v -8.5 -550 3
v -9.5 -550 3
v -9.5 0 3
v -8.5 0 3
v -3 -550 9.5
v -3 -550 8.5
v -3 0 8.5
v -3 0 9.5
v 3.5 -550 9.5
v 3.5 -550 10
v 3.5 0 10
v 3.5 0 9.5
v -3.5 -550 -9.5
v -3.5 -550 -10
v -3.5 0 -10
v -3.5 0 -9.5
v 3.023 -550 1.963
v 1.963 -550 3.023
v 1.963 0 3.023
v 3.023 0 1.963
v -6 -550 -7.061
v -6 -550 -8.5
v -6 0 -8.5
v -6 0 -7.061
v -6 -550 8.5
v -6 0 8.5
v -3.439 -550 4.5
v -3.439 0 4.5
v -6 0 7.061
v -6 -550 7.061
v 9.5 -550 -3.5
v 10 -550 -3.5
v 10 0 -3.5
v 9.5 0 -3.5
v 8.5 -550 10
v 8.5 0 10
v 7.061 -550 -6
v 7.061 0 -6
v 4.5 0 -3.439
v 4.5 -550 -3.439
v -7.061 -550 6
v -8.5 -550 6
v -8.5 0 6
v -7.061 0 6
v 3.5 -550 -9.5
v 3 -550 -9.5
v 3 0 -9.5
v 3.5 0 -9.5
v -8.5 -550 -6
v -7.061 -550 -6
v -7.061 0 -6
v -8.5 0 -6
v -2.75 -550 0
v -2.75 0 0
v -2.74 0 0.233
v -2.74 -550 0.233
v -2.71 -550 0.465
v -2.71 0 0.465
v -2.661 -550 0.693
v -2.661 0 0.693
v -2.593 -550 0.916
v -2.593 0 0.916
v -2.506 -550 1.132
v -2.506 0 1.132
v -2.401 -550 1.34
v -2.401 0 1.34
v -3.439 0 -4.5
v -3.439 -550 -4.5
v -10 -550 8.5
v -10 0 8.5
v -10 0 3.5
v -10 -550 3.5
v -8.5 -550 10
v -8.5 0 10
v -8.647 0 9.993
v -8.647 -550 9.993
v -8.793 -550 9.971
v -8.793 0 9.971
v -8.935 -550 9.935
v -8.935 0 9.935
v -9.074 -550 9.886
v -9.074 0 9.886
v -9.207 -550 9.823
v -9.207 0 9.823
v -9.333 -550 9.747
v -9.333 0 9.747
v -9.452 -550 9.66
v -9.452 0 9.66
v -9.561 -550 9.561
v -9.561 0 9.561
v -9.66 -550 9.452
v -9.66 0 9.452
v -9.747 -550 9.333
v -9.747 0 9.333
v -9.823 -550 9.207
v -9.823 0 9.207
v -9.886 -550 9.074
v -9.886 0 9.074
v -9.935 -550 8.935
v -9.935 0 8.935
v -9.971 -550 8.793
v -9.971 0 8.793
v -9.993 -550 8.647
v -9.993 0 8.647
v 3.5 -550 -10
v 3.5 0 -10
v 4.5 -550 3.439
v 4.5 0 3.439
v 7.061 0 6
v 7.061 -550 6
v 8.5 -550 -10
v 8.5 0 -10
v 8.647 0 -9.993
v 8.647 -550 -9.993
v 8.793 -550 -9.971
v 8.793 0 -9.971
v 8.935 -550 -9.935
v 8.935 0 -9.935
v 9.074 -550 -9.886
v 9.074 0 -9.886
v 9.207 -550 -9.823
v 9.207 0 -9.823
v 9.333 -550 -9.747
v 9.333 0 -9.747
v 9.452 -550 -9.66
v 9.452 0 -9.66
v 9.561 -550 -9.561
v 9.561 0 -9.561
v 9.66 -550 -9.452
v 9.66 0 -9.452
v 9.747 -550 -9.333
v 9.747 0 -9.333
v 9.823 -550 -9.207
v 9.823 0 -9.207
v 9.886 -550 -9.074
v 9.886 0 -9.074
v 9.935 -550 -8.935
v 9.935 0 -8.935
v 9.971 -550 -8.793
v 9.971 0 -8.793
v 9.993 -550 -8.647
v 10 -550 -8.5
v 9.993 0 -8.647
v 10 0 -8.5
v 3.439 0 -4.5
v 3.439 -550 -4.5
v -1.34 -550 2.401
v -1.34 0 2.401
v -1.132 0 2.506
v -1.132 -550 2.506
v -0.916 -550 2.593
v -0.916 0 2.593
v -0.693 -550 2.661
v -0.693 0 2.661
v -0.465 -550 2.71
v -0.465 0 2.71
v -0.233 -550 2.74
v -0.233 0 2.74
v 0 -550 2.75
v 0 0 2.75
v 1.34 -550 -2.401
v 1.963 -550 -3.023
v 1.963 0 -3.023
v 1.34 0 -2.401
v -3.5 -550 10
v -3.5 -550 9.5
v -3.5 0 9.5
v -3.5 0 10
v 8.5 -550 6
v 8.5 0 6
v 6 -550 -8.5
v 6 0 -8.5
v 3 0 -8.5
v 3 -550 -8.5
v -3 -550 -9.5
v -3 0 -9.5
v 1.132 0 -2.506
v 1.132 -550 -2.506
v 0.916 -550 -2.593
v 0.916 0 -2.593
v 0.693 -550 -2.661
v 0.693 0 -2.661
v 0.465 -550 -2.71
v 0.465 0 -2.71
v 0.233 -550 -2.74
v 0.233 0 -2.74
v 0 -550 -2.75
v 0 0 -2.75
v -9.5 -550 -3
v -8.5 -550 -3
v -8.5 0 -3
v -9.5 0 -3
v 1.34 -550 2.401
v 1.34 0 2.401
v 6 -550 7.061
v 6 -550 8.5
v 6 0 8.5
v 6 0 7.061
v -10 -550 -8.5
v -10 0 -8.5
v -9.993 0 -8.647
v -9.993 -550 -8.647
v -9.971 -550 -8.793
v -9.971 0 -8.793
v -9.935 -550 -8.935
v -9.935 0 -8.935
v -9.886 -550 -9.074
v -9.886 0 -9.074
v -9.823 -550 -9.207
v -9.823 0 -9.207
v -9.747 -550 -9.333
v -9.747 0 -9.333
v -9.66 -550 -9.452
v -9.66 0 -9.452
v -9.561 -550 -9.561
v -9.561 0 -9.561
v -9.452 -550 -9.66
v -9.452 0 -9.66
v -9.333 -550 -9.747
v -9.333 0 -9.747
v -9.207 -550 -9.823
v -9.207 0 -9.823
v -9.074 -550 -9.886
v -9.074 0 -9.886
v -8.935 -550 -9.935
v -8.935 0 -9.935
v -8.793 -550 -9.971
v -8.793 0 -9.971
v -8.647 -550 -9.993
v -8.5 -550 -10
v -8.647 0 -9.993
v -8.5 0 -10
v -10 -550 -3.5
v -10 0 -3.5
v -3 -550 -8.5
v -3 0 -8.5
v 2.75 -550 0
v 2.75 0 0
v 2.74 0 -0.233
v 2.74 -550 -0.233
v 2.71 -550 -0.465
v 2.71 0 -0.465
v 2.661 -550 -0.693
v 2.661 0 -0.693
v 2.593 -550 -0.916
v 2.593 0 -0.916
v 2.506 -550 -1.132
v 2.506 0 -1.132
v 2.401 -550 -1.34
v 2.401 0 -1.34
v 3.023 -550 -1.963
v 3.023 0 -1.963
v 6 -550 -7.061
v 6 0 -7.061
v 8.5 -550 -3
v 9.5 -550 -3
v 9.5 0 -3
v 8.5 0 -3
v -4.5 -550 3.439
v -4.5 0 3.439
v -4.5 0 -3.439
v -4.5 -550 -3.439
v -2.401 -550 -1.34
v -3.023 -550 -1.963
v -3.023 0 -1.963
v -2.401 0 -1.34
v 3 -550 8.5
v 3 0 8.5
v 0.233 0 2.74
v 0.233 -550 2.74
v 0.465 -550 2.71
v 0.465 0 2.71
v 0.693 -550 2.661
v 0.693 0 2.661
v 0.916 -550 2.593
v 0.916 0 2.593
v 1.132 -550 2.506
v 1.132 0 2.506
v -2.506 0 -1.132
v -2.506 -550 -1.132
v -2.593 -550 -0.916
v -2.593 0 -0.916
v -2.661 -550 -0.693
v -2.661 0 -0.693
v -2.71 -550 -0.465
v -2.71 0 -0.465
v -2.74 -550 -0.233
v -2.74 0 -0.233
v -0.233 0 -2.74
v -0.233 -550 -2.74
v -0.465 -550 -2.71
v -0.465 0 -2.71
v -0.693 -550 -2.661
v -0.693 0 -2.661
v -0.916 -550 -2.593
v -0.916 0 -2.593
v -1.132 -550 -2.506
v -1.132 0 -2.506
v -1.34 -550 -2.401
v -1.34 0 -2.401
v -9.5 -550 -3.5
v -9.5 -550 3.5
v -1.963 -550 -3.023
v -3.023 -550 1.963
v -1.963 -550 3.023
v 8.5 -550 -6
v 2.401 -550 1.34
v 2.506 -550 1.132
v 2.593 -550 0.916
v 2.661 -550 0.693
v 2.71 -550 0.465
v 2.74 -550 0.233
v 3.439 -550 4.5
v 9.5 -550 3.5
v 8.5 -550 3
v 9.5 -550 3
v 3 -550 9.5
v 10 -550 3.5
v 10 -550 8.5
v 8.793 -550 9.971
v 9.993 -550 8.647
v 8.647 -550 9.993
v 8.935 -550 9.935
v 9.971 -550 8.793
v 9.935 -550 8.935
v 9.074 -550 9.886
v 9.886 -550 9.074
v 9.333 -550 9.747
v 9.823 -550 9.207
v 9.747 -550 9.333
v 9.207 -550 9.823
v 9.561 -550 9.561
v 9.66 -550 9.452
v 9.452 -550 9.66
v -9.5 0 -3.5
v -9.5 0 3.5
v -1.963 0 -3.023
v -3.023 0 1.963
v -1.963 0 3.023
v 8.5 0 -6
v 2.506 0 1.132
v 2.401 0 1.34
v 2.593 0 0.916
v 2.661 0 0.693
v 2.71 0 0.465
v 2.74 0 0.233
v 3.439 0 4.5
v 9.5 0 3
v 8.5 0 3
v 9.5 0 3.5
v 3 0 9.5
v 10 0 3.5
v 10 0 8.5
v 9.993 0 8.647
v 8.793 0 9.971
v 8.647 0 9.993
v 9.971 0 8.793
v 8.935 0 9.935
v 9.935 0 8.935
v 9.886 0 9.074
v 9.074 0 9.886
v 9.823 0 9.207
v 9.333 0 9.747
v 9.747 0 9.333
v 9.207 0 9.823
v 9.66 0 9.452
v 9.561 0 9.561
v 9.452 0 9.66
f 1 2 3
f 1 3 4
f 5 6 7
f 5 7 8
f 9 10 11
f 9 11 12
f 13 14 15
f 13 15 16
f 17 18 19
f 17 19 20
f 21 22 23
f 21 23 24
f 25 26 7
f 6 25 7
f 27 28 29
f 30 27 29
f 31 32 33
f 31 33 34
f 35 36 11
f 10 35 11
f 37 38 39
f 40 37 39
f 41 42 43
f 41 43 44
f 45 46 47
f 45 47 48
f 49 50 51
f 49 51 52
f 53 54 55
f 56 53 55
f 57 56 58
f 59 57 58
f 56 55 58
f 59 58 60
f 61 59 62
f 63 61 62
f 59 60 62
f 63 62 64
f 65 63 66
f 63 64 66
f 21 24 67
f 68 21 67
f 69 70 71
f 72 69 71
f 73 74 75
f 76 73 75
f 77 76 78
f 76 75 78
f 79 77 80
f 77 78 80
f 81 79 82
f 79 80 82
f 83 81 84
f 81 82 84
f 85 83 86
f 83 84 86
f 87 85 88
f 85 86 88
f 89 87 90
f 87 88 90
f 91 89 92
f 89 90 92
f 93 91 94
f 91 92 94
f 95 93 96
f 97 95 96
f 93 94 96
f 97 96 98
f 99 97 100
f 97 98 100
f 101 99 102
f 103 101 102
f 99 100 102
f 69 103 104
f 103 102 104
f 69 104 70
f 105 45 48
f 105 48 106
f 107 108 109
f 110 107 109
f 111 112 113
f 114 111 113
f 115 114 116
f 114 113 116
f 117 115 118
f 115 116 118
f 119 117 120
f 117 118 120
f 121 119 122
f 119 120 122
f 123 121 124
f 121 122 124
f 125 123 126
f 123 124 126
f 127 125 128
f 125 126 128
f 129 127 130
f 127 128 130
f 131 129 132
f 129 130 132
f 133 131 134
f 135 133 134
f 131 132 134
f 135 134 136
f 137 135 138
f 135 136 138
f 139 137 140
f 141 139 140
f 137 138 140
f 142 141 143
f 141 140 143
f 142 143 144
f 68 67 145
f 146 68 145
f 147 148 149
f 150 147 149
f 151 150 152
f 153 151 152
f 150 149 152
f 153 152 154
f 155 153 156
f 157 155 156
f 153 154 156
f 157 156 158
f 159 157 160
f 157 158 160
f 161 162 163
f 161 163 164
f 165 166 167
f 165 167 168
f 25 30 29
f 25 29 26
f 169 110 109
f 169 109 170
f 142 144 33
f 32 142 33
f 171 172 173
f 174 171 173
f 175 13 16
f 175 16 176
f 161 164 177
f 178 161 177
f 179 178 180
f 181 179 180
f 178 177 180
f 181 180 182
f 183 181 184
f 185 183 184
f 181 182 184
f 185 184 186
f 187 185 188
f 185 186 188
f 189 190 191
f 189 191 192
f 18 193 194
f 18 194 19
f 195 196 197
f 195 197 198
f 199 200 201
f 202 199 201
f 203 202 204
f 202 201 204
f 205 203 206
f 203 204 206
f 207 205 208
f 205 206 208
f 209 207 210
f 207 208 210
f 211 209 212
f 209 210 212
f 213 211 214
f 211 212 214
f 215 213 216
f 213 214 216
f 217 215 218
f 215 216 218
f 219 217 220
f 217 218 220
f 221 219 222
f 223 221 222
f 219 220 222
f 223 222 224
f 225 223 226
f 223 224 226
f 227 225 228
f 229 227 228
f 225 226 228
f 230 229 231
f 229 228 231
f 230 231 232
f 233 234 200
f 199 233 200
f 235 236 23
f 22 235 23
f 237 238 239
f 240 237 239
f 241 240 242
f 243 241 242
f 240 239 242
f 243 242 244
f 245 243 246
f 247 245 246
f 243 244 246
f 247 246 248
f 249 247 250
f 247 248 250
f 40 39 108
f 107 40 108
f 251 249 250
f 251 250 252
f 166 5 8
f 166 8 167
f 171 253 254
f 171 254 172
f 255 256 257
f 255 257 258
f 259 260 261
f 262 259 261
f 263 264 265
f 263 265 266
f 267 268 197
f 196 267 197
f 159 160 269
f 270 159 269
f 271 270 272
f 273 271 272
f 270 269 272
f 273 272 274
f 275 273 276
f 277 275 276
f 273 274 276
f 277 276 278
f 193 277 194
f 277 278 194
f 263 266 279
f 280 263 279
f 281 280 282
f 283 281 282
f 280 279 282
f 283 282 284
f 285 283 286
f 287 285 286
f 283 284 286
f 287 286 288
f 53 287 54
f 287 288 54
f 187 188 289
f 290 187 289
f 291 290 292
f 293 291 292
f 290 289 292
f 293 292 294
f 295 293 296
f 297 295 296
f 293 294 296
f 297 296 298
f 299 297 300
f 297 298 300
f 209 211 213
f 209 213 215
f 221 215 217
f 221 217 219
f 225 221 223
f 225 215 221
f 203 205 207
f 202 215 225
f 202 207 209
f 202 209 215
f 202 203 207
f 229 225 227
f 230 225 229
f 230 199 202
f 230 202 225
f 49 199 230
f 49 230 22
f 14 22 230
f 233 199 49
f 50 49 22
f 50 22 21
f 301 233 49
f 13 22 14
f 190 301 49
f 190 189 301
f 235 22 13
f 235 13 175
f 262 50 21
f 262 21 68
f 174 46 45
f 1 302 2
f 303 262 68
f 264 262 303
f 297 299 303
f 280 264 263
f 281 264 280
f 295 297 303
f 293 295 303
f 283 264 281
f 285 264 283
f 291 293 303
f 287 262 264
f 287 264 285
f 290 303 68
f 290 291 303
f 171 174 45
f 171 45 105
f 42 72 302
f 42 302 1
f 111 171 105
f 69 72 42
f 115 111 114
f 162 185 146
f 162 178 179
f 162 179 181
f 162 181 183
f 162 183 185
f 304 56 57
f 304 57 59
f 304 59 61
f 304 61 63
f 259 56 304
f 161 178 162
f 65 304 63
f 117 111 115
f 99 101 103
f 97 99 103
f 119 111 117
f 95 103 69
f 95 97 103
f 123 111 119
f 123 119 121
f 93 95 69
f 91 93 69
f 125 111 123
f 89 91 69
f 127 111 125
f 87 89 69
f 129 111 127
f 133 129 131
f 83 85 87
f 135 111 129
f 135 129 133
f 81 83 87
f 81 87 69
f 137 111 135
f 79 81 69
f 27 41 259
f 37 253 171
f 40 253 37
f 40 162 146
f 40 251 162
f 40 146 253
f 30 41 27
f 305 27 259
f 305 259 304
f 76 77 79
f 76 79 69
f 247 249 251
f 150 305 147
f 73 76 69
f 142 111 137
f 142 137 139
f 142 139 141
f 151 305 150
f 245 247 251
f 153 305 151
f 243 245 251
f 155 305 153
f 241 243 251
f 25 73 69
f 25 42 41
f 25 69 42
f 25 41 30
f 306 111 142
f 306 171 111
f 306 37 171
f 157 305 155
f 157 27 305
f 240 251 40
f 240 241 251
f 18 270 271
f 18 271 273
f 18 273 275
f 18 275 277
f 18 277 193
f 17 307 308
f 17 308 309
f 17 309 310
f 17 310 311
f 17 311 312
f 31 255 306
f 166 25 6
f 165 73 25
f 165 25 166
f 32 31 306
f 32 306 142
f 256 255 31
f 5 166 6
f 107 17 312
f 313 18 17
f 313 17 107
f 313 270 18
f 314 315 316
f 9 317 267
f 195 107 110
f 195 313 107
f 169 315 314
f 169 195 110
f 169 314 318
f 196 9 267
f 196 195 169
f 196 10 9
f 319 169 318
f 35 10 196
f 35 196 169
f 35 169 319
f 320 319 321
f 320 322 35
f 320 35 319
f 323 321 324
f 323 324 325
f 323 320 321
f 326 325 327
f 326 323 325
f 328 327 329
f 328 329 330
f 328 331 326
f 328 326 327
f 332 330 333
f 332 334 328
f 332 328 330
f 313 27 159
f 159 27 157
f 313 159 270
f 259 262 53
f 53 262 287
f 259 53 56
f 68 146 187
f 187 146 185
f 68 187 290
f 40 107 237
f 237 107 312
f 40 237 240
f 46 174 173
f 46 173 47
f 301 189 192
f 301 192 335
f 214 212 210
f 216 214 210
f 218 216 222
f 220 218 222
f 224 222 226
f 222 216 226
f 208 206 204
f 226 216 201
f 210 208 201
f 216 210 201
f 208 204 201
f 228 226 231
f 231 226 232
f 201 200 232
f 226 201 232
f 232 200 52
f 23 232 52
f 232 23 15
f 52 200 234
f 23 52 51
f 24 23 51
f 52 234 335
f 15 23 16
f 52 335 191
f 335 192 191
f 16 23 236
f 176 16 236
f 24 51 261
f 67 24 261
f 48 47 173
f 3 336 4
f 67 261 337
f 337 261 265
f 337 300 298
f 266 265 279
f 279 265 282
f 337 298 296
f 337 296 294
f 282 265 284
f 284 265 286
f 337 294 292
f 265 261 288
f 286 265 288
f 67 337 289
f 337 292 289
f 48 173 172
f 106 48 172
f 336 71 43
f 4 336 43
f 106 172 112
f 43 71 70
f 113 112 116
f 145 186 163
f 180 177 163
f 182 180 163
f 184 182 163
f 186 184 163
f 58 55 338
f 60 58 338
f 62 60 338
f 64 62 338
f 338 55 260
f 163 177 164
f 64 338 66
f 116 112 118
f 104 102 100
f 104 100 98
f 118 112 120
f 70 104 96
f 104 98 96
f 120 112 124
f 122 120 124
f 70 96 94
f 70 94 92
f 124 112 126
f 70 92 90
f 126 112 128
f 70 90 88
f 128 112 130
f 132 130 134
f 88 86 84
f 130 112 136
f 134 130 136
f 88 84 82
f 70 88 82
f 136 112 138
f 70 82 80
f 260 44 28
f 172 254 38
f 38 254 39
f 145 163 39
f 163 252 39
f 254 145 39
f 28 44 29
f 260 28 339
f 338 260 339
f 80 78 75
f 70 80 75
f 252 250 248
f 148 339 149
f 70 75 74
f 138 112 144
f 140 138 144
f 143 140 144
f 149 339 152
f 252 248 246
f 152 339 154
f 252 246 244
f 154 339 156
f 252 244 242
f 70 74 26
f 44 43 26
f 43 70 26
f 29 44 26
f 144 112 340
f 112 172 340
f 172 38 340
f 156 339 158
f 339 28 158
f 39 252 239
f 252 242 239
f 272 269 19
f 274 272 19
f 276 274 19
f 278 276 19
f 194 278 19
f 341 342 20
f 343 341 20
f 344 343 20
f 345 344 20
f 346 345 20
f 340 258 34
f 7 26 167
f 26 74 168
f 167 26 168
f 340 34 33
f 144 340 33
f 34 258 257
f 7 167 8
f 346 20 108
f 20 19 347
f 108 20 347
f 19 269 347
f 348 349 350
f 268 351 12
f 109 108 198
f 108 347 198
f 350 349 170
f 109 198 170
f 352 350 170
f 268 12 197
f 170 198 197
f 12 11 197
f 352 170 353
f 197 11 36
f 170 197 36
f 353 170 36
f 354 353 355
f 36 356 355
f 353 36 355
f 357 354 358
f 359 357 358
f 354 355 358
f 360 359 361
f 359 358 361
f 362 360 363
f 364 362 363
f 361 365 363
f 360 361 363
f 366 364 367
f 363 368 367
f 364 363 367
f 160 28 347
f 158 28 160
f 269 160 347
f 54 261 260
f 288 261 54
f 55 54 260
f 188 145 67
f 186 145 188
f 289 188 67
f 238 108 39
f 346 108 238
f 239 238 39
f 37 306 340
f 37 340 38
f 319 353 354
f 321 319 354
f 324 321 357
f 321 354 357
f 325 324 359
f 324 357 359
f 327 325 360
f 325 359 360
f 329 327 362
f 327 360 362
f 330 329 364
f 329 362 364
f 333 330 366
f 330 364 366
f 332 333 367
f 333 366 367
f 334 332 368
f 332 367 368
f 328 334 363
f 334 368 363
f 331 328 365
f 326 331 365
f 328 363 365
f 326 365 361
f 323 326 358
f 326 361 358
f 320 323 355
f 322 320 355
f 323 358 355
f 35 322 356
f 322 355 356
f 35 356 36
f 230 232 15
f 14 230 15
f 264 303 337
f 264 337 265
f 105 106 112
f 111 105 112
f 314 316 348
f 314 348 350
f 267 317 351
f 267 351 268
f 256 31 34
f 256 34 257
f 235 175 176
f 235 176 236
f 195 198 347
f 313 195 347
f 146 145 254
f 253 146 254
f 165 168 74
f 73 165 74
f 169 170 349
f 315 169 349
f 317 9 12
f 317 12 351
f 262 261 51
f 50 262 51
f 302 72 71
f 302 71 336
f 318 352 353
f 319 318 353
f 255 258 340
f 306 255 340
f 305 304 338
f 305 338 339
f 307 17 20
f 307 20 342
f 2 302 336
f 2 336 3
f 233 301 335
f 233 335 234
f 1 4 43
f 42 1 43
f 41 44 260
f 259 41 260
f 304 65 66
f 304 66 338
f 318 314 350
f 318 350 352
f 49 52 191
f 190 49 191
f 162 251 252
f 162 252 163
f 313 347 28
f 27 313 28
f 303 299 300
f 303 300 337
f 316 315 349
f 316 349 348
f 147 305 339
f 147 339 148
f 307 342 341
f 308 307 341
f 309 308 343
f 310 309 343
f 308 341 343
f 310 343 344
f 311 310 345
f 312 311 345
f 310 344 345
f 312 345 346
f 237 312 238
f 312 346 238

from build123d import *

# Parameters (mm, degrees)
F1_DEPTH = 550


with BuildPart() as f1:
    # F0 (on Front) → F1 (new body)
    with BuildSketch(Plane.XZ):
        with BuildLine():
            Line((3.43934, 4.5), (0, 4.5))
            Line((0, 4.5), (-3.43934, 4.5))
            Line((-3.43934, 4.5), (-6, 7.06066))
            Line((-6, 7.06066), (-6, 8.5))
            Line((-6, 8.5), (-3, 8.5))
            Line((-3, 8.5), (-3, 9.5))
            Line((-3, 9.5), (-3.5, 9.5))
            Line((-3.5, 9.5), (-3.5, 10))
            Line((-3.5, 10), (-8.5, 10))
            ThreePointArc((-8.5, 10), (-9.56066, 9.56066), (-10, 8.5))
            Line((-10, 8.5), (-10, 3.5))
            Line((-10, 3.5), (-9.5, 3.5))
            Line((-9.5, 3.5), (-9.5, 3))
            Line((-9.5, 3), (-8.5, 3))
            Line((-8.5, 3), (-8.5, 6))
            Line((-8.5, 6), (-7.06066, 6))
            Line((-7.06066, 6), (-4.5, 3.43934))
            Line((-4.5, 3.43934), (-4.5, 0))
            Line((-4.5, 0), (-4.5, -3.43934))
            Line((-4.5, -3.43934), (-7.06066, -6))
            Line((-7.06066, -6), (-8.5, -6))
            Line((-8.5, -6), (-8.5, -3))
            Line((-8.5, -3), (-9.5, -3))
            Line((-9.5, -3), (-9.5, -3.5))
            Line((-9.5, -3.5), (-10, -3.5))
            Line((-10, -3.5), (-10, -8.5))
            ThreePointArc((-10, -8.5), (-9.56066, -9.56066), (-8.5, -10))
            Line((-8.5, -10), (-3.5, -10))
            Line((-3.5, -10), (-3.5, -9.5))
            Line((-3.5, -9.5), (-3, -9.5))
            Line((-3, -9.5), (-3, -8.5))
            Line((-3, -8.5), (-6, -8.5))
            Line((-6, -8.5), (-6, -7.06066))
            Line((-6, -7.06066), (-3.43934, -4.5))
            Line((-3.43934, -4.5), (0, -4.5))
            Line((0, -4.5), (3.43934, -4.5))
            Line((3.43934, -4.5), (6, -7.06066))
            Line((6, -7.06066), (6, -8.5))
            Line((6, -8.5), (3, -8.5))
            Line((3, -8.5), (3, -9.5))
            Line((3, -9.5), (3.5, -9.5))
            Line((3.5, -9.5), (3.5, -10))
            Line((3.5, -10), (8.5, -10))
            ThreePointArc((8.5, -10), (9.56066, -9.56066), (10, -8.5))
            Line((10, -8.5), (10, -3.5))
            Line((10, -3.5), (9.5, -3.5))
            Line((9.5, -3.5), (9.5, -3))
            Line((9.5, -3), (8.5, -3))
            Line((8.5, -3), (8.5, -6))
            Line((8.5, -6), (7.06066, -6))
            Line((7.06066, -6), (4.5, -3.43934))
            Line((4.5, -3.43934), (4.5, 0))
            Line((4.5, 0), (4.5, 3.43934))
            Line((4.5, 3.43934), (7.06066, 6))
            Line((7.06066, 6), (8.5, 6))
            Line((8.5, 6), (8.5, 3))
            Line((8.5, 3), (9.5, 3))
            Line((9.5, 3), (9.5, 3.5))
            Line((9.5, 3.5), (10, 3.5))
            Line((10, 3.5), (10, 8.5))
            ThreePointArc((10, 8.5), (9.56066, 9.56066), (8.5, 10))
            Line((8.5, 10), (3.5, 10))
            Line((3.5, 10), (3.5, 9.5))
            Line((3.5, 9.5), (3, 9.5))
            Line((3, 9.5), (3, 8.5))
            Line((3, 8.5), (6, 8.5))
            Line((6, 8.5), (6, 7.06066))
            Line((6, 7.06066), (3.43934, 4.5))
        make_face()
        with BuildLine():
            ThreePointArc((-1.340499, 2.401159), (-0.692573, 2.661361), (0, 2.75))
            ThreePointArc((0, 2.75), (0.692573, 2.661361), (1.340499, 2.401159))
            Line((1.340499, 2.401159), (1.962753, 3.023413))
            Line((1.962753, 3.023413), (3.023413, 1.962753))
            Line((3.023413, 1.962753), (2.401159, 1.340499))
            ThreePointArc((2.401159, 1.340499), (2.661361, 0.692573), (2.75, 0))
            ThreePointArc((2.75, 0), (2.661361, -0.692573), (2.401159, -1.340499))
            Line((2.401159, -1.340499), (3.023413, -1.962753))
            Line((3.023413, -1.962753), (1.962753, -3.023413))
            Line((1.962753, -3.023413), (1.340499, -2.401159))
            ThreePointArc((1.340499, -2.401159), (0.692573, -2.661361), (0, -2.75))
            ThreePointArc((0, -2.75), (-0.692573, -2.661361), (-1.340499, -2.401159))
            Line((-1.340499, -2.401159), (-1.962753, -3.023413))
            Line((-1.962753, -3.023413), (-3.023413, -1.962753))
            Line((-3.023413, -1.962753), (-2.401159, -1.340499))
            ThreePointArc((-2.401159, -1.340499), (-2.661361, -0.692573), (-2.75, 0))
            ThreePointArc((-2.75, 0), (-2.661361, 0.692573), (-2.401159, 1.340499))
            Line((-2.401159, 1.340499), (-3.023413, 1.962753))
            Line((-3.023413, 1.962753), (-1.962753, 3.023413))
            Line((-1.962753, 3.023413), (-1.340499, 2.401159))
        make_face(mode=Mode.SUBTRACT)
    extrude(amount=F1_DEPTH)


solid = f1.part
